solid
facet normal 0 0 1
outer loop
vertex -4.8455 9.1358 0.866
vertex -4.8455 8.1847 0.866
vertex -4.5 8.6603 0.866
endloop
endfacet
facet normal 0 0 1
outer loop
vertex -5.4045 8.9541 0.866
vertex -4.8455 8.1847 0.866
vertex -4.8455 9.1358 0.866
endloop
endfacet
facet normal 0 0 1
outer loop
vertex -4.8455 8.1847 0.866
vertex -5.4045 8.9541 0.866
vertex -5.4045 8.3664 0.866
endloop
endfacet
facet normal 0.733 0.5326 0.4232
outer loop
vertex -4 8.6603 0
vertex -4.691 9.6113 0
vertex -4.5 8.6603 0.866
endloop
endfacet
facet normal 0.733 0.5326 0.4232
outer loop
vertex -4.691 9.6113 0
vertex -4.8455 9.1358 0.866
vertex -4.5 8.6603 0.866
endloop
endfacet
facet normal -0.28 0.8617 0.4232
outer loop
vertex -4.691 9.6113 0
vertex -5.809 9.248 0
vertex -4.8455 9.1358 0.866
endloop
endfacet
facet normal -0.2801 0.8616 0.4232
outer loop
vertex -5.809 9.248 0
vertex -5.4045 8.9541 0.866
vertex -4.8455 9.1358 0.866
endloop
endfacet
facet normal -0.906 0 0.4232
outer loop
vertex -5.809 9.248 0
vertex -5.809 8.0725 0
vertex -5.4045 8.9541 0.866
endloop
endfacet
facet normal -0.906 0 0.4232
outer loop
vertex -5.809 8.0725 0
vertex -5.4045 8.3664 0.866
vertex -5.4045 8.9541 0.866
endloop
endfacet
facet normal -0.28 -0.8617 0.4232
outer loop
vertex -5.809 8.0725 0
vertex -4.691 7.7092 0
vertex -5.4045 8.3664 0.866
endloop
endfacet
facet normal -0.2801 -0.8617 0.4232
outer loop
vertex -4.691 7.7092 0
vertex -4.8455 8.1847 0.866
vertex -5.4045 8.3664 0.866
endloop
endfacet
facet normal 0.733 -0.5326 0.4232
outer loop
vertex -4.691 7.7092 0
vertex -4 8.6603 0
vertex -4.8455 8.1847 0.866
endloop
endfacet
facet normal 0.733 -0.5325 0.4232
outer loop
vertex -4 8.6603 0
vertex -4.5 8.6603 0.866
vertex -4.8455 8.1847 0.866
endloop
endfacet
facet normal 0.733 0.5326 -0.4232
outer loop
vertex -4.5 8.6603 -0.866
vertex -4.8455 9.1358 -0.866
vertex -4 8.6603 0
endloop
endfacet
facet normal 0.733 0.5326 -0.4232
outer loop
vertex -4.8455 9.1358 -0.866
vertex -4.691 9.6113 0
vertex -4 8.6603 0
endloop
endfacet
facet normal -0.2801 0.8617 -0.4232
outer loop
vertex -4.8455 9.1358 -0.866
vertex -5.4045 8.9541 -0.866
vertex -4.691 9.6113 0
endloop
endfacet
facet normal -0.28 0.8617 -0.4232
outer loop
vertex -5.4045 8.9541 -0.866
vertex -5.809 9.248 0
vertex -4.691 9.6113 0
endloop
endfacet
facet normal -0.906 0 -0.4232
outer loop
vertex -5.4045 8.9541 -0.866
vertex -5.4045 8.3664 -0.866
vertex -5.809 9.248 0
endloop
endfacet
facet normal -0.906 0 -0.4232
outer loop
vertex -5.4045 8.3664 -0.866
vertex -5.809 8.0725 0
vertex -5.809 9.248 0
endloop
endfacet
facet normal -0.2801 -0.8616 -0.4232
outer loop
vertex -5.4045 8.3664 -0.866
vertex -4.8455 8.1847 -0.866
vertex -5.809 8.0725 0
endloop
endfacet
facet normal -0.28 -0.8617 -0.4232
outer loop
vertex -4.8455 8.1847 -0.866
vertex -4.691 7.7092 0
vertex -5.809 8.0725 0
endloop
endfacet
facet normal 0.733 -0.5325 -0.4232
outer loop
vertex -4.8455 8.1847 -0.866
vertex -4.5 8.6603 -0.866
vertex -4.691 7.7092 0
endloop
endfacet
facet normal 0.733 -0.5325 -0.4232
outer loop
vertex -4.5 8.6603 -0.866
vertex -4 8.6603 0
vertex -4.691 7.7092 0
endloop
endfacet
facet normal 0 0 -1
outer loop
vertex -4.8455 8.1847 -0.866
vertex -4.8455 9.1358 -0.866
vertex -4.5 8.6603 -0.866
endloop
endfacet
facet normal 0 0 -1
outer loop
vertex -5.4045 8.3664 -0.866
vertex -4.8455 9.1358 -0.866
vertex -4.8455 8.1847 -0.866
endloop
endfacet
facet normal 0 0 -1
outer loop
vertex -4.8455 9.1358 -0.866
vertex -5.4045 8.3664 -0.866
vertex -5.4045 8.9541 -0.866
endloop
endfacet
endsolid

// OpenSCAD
//cos and sin values are x and y values of a circular polygon.
//We assume that radius is 10, which is hypotenuse (Otivooz).
//So sin(a) = perpendicular / hypotenuse. Because hypotenuse is 10.
//we just have to multiply the sin value with 10 wich is 
//y axis value.
a = 1*360/3;
x = 10*cos(a);
y = 10*sin(a);
translate([x, y]) sphere(r=1);

a1 = 2*360/3;
x1 = 10*cos(a1);
y1 = 10*sin(a1);
//translate([x1, y1]) sphere(r=1);

a2 = 3*360/3;
x2 = 10*cos(a2);
y2 = 10*sin(a2);
//translate([x2, y2]) sphere(r=1);
